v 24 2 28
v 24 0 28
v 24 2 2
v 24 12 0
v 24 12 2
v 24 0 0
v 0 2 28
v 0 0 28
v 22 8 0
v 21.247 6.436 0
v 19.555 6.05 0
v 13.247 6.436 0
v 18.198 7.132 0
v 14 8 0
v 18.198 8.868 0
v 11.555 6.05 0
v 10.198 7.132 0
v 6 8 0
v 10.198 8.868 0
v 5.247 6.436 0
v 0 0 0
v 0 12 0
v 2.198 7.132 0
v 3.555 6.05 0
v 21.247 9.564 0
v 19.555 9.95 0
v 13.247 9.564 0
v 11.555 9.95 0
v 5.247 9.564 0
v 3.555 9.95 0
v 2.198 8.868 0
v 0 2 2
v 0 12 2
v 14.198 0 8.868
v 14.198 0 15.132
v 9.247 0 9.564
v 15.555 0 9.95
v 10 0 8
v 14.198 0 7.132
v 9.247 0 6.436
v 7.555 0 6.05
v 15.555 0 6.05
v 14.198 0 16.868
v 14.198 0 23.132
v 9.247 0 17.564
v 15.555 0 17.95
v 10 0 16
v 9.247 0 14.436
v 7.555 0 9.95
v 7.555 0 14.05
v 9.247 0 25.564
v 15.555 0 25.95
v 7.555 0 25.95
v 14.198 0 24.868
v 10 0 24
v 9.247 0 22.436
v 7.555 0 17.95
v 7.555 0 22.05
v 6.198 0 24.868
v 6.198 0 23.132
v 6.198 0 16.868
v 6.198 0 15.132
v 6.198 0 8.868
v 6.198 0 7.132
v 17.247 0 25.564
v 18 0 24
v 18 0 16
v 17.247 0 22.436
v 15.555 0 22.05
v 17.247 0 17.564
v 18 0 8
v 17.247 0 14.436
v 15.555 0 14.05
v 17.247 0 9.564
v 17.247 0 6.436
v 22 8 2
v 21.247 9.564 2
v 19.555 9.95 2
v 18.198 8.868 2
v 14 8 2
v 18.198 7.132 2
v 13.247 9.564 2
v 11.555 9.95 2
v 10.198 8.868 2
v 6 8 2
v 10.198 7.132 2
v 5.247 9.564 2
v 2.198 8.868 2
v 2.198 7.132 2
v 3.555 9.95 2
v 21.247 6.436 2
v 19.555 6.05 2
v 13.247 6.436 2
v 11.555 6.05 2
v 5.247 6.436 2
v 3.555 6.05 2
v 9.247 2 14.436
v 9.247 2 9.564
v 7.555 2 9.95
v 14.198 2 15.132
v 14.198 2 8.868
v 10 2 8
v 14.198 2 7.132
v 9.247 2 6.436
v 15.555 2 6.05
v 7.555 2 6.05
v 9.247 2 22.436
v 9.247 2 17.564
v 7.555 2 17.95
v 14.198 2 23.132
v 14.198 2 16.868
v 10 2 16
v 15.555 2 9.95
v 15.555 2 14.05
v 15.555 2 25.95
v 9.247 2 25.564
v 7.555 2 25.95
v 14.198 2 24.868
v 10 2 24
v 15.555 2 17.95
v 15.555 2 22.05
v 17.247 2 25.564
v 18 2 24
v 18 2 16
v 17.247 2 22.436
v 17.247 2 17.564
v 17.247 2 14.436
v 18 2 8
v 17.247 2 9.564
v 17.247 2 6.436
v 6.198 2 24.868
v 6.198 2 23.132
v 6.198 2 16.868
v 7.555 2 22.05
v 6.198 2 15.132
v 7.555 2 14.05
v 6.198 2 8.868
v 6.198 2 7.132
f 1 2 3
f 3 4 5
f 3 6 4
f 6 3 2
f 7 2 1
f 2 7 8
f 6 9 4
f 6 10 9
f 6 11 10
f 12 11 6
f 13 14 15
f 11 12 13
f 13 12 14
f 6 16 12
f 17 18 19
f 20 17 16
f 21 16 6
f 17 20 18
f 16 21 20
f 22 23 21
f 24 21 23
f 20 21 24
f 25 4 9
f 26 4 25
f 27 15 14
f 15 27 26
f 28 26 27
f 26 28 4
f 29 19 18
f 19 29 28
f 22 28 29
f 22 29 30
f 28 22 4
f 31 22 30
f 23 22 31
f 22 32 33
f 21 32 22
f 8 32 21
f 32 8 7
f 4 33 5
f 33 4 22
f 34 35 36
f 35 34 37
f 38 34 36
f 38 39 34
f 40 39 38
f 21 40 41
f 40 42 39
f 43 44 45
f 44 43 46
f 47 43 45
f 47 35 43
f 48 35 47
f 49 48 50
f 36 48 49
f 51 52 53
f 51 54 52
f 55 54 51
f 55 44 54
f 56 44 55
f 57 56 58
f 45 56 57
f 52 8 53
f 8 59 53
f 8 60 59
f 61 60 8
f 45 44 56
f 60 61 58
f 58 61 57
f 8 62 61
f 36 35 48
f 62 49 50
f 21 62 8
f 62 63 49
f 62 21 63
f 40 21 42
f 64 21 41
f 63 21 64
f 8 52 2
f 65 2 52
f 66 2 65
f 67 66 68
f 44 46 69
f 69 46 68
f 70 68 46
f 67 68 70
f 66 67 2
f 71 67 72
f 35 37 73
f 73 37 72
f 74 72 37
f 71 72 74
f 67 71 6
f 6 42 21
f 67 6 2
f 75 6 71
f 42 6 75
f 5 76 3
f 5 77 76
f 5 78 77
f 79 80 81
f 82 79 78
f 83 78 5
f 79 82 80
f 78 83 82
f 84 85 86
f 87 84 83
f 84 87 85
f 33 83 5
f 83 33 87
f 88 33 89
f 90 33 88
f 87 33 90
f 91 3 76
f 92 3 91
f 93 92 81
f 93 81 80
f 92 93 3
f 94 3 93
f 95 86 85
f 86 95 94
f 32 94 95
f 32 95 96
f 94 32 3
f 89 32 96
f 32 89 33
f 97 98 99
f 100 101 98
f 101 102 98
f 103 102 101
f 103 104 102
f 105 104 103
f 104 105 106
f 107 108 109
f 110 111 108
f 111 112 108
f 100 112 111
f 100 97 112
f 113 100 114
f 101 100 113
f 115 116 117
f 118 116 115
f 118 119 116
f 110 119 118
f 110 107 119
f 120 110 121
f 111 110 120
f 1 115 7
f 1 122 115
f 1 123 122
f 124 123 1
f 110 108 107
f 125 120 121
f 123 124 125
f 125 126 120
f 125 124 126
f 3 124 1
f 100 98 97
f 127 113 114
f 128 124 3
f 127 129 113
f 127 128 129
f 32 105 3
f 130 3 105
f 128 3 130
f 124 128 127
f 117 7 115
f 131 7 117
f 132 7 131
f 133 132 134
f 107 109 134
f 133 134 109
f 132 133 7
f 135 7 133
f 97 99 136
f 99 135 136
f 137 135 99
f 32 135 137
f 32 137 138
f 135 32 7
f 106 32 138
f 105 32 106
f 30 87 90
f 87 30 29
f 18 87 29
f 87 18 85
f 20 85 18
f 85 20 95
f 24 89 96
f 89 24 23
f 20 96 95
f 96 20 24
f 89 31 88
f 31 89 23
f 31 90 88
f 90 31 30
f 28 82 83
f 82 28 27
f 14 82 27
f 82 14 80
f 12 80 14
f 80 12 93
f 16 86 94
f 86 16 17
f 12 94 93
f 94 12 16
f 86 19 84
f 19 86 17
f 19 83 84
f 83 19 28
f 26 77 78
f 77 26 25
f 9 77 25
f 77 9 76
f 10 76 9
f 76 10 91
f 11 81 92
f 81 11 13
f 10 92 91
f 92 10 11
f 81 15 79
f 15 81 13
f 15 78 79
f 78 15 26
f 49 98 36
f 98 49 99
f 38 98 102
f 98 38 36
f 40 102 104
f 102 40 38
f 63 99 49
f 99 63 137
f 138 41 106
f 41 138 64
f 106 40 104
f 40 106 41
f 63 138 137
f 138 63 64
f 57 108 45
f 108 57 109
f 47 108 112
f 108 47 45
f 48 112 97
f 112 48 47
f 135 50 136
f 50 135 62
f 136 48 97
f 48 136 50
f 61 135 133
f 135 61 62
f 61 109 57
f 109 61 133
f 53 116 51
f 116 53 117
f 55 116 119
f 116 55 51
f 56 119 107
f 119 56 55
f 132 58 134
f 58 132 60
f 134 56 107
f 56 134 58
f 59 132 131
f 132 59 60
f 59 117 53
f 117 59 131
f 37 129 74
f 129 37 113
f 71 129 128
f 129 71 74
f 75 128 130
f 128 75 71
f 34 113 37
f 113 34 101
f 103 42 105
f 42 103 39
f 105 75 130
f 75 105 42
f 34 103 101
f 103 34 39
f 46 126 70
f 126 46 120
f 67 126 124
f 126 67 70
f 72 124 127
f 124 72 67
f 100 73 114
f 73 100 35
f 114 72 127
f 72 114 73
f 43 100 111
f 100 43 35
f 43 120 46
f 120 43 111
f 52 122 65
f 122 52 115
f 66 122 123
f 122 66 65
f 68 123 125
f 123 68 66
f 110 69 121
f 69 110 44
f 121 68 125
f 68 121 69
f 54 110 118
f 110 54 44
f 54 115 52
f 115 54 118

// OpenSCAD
epaisseur = 2;
hauteur = 3;
profondeur = 1;
largeur = 3;
difference(){
difference(){
    cube([largeur*8,profondeur*8+4,hauteur*8+4]);
    translate([-1, epaisseur, epaisseur]){
        cube([largeur*8+2,profondeur*8+4,hauteur*8+4]);};
};

union(){
    for(i=[0:largeur-1]){
        for(j=[0:profondeur-1]){
            translate([4+ 8*i, 8+8*j, -1]){cylinder(h=6, r=2);}
            }
        }
    
    
    
translate([0,4,0]){   
    rotate([90,0,0]){
        union(){
            for(i=[0:1]){
                for(j=[0:hauteur-1]){
                    translate([8+ 8*i, 8+8*j, 0]){cylinder(h=6, r=2);}
                }
            }
        }
    }
}

}
}
